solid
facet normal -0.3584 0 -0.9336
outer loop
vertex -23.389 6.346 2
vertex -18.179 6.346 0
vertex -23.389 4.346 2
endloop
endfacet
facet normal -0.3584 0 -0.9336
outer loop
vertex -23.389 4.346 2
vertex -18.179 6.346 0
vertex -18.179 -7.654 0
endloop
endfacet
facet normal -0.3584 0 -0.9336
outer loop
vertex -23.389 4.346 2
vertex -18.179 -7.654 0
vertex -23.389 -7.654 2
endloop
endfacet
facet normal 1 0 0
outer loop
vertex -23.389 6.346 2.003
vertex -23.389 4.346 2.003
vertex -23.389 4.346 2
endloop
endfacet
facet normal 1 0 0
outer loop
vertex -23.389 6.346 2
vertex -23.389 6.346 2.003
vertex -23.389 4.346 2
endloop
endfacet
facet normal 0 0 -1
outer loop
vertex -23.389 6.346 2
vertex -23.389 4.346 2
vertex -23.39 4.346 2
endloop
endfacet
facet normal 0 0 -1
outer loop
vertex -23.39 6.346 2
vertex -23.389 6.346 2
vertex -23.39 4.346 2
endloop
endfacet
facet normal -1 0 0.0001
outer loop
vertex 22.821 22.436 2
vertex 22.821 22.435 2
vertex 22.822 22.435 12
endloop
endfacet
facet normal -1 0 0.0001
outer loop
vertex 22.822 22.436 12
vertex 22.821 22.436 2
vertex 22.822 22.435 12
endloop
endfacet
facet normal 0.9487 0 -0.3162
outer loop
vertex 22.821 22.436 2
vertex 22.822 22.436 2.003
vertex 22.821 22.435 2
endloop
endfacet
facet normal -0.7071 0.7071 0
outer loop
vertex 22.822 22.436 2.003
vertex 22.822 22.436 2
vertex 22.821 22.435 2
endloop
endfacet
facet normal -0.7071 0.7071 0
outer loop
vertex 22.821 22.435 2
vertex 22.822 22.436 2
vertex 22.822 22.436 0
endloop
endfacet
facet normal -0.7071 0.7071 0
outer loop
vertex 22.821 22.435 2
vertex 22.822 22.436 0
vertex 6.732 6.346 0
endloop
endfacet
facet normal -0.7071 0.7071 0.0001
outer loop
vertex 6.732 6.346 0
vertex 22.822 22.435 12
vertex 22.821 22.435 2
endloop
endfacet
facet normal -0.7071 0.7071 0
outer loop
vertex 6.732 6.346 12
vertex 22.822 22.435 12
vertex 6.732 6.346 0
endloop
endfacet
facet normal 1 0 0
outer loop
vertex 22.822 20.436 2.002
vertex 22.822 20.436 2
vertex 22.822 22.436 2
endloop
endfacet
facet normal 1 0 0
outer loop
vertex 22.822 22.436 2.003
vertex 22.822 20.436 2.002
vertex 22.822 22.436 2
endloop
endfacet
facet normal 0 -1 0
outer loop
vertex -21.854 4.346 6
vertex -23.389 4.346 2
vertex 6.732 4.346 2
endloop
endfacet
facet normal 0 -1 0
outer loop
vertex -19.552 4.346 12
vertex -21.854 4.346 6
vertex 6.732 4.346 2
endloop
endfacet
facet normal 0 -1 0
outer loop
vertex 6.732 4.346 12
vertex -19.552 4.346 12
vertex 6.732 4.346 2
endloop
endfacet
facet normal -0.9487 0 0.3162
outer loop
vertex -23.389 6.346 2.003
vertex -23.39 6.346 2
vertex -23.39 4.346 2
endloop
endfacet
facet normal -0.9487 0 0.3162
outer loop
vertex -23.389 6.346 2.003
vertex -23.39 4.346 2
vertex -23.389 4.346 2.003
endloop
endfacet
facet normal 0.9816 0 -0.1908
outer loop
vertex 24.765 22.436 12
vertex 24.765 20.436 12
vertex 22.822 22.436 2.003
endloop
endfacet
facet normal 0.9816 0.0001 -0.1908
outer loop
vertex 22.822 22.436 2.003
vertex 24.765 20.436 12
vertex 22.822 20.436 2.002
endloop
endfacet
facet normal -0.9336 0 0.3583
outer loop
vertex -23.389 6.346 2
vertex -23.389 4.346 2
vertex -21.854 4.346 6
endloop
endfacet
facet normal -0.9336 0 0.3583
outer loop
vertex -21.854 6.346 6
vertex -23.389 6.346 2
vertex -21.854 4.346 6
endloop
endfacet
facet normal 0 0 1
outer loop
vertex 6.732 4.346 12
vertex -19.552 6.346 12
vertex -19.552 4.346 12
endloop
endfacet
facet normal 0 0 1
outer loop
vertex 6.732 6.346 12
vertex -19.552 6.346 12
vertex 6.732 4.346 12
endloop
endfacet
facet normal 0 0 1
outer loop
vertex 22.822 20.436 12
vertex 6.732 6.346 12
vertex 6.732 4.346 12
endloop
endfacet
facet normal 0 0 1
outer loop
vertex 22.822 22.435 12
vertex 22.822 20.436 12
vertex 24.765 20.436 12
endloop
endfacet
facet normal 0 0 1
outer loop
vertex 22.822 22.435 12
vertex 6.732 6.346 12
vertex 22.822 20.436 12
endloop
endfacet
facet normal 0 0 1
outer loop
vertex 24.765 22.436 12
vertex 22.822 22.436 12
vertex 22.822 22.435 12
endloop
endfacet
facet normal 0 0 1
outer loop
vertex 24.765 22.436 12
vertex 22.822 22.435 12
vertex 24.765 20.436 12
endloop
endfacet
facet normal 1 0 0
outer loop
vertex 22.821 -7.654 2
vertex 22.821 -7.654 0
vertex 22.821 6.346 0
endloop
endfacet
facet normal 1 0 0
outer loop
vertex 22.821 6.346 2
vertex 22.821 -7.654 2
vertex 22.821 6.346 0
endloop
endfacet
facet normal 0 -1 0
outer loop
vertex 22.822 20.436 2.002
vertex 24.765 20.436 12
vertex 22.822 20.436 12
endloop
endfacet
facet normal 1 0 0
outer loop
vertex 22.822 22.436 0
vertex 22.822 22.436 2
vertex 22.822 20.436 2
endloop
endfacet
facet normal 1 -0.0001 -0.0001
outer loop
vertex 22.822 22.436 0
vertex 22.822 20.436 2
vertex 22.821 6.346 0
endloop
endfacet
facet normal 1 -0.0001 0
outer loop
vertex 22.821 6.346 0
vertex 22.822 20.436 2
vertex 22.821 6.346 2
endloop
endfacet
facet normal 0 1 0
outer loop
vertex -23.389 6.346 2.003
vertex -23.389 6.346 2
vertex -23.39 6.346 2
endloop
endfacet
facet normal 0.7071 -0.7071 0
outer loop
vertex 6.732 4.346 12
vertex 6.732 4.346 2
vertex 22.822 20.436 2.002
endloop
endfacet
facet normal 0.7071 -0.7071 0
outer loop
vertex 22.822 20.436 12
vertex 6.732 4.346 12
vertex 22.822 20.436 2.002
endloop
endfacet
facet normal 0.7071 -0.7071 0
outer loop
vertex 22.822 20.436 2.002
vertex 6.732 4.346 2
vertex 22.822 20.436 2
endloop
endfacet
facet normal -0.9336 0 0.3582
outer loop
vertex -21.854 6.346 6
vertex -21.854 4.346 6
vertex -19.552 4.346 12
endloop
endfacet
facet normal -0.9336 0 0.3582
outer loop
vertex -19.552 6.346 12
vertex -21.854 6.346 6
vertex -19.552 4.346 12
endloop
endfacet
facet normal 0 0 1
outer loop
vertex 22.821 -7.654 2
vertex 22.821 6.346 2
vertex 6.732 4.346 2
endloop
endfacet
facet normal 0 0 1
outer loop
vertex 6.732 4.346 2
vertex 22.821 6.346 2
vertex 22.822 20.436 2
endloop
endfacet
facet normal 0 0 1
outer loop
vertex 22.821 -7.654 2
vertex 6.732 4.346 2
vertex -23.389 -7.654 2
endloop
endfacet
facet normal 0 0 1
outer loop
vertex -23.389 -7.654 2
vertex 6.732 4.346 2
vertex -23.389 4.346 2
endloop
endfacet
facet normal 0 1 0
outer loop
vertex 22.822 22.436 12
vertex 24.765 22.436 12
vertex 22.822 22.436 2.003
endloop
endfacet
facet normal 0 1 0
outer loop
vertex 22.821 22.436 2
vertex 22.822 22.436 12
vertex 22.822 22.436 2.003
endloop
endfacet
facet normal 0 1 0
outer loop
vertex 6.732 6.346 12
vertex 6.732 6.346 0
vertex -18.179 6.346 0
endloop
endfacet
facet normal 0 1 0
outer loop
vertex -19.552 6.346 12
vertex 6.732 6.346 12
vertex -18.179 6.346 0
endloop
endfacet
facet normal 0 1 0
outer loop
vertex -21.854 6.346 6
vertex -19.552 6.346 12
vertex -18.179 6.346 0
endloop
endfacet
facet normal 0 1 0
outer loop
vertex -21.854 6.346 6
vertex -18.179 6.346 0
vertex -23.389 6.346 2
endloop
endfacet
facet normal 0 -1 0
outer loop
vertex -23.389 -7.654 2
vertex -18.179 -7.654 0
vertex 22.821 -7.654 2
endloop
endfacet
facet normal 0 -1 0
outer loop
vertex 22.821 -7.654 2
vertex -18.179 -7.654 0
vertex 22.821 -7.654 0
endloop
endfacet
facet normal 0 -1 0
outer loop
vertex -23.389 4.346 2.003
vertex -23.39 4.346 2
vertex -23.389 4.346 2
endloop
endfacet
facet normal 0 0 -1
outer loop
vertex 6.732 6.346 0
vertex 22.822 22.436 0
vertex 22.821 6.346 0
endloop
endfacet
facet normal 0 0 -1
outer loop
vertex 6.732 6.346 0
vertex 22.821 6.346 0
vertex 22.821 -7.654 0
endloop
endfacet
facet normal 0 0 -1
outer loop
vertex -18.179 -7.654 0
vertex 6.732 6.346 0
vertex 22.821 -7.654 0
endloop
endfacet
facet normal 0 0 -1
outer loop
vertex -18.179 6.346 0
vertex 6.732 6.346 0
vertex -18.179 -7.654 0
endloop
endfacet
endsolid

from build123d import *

# Parameters (mm, degrees)
SKETCH1_W               = 69
SKETCH1_H               = 14
BOSS_EXTRUDE1_DEPTH     = 2
SKETCH2_W               = 52.910547302
SKETCH2_H               = 2
BOSS_EXTRUDE2_DEPTH     = 4
CUT_EXTRUDE1_DEPTH      = 20
CUT_EXTRUDE1_DEPTH_BACK = 20
CUT_EXTRUDE2_DEPTH      = 2
BOSS_EXTRUDE3_DEPTH     = 2
BOSS_EXTRUDE4_DEPTH     = 4
BOSS_EXTRUDE5_DEPTH     = 6
CUT_EXTRUDE3_DEPTH      = 6
BOSS_EXTRUDE6_START     = -16.09
BOSS_EXTRUDE6_DEPTH     = 2


with BuildPart() as part:
    # Sketch1 → Boss-Extrude1 (new body)
    with BuildSketch(Plane.XY):
        with Locations((-11.678861789, -0.654471545)):
            Rectangle(SKETCH1_W, SKETCH1_H)
    extrude(amount=BOSS_EXTRUDE1_DEPTH)

    # Sketch2 → Boss-Extrude2 (add)
    with BuildSketch(Plane.XY.offset(2)):
        with Locations((-19.723588138, 5.345528455)):
            Rectangle(SKETCH2_W, SKETCH2_H)
    extrude(amount=BOSS_EXTRUDE2_DEPTH)

    # Sketch4 → Cut-Extrude1 (cut, two sides: drawn at the far end of the back side and taken through both)
    with BuildSketch(Plane(origin=(0, 6.345528455, 0), x_dir=(1, 0, 0), z_dir=(0, 1, 0)).offset(-CUT_EXTRUDE1_DEPTH_BACK)):
        Polygon((-18.178861789, 0), (-33.809396177, -6), (-46.178861789, -6), (-46.178861789, 0), align=None)
    extrude(amount=CUT_EXTRUDE1_DEPTH + CUT_EXTRUDE1_DEPTH_BACK, mode=Mode.SUBTRACT)

    # Sketch5 → Cut-Extrude2 (cut)
    with BuildSketch(Plane(origin=(0, 6.345528455, 0), x_dir=(1, 0, 0), z_dir=(0, 1, 0))):
        Polygon((-33.809396177, -6), (-23.38959077, -2.000211452), (-21.854215798, -6), align=None)
    extrude(amount=-CUT_EXTRUDE2_DEPTH, mode=Mode.SUBTRACT)

    # Sketch6 → Boss-Extrude3 (add)
    with BuildSketch(Plane.XY.offset(2)):
        Polygon((6.731685513, 6.345528455), (22.821685513, 22.435528455), (22.821138211, 6.345528455), align=None)
    extrude(amount=-BOSS_EXTRUDE3_DEPTH)

    # Sketch7 → Boss-Extrude4 (add)
    with BuildSketch(Plane.XY.offset(2)):
        Polygon((6.731685513, 4.345528455), (22.821617483, 20.435528456), (22.821685513, 22.435528455), (6.731685513, 6.345528455), align=None)
    extrude(amount=BOSS_EXTRUDE4_DEPTH)

    # Sketch8 → Boss-Extrude5 (add)
    with BuildSketch(Plane.XY.offset(6)):
        Polygon((22.821685513, 22.435528455), (6.731685513, 6.345528455), (-21.854215798, 6.345528455), (-21.854215798, 4.345528455), (6.731685513, 4.345528455), (22.821617483, 20.435528456), align=None)
    extrude(amount=BOSS_EXTRUDE5_DEPTH)

    # Sketch9 → Cut-Extrude3 (cut)
    with BuildSketch(Plane.XZ.offset(-4.345528455)):
        Polygon((-23.389039918, 2), (-21.854215798, 6), (-19.551979619, 12), (-21.854215798, 12), align=None)
    extrude(amount=-CUT_EXTRUDE3_DEPTH, mode=Mode.SUBTRACT)


with BuildPart() as cut_extrude3_piece_1:
    # of the separate pieces the step leaves, piece 1, a body of its own (cut_extrude3_pieces)
    add(part.part.solids().sort_by_distance((-18.178861789, 6.345528455, 0))[0])

    # Sketch10 → Boss-Extrude6 (add)
    with BuildSketch(Plane.XZ.offset(-4.345528455).offset(BOSS_EXTRUDE6_START)):
        Polygon((22.821617483, 12), (24.765438688, 12), (22.821138211, 2), align=None)
    extrude(amount=-BOSS_EXTRUDE6_DEPTH)


with BuildPart() as cut_extrude3_piece_2:
    # of the separate pieces the step leaves, piece 2, a body of its own (cut_extrude3_pieces)
    add(part.part.solids().sort_by_distance((-23.38861886, 6.345528455, 2.002743364))[0])


solid = Compound([cut_extrude3_piece_1.part, cut_extrude3_piece_2.part])
